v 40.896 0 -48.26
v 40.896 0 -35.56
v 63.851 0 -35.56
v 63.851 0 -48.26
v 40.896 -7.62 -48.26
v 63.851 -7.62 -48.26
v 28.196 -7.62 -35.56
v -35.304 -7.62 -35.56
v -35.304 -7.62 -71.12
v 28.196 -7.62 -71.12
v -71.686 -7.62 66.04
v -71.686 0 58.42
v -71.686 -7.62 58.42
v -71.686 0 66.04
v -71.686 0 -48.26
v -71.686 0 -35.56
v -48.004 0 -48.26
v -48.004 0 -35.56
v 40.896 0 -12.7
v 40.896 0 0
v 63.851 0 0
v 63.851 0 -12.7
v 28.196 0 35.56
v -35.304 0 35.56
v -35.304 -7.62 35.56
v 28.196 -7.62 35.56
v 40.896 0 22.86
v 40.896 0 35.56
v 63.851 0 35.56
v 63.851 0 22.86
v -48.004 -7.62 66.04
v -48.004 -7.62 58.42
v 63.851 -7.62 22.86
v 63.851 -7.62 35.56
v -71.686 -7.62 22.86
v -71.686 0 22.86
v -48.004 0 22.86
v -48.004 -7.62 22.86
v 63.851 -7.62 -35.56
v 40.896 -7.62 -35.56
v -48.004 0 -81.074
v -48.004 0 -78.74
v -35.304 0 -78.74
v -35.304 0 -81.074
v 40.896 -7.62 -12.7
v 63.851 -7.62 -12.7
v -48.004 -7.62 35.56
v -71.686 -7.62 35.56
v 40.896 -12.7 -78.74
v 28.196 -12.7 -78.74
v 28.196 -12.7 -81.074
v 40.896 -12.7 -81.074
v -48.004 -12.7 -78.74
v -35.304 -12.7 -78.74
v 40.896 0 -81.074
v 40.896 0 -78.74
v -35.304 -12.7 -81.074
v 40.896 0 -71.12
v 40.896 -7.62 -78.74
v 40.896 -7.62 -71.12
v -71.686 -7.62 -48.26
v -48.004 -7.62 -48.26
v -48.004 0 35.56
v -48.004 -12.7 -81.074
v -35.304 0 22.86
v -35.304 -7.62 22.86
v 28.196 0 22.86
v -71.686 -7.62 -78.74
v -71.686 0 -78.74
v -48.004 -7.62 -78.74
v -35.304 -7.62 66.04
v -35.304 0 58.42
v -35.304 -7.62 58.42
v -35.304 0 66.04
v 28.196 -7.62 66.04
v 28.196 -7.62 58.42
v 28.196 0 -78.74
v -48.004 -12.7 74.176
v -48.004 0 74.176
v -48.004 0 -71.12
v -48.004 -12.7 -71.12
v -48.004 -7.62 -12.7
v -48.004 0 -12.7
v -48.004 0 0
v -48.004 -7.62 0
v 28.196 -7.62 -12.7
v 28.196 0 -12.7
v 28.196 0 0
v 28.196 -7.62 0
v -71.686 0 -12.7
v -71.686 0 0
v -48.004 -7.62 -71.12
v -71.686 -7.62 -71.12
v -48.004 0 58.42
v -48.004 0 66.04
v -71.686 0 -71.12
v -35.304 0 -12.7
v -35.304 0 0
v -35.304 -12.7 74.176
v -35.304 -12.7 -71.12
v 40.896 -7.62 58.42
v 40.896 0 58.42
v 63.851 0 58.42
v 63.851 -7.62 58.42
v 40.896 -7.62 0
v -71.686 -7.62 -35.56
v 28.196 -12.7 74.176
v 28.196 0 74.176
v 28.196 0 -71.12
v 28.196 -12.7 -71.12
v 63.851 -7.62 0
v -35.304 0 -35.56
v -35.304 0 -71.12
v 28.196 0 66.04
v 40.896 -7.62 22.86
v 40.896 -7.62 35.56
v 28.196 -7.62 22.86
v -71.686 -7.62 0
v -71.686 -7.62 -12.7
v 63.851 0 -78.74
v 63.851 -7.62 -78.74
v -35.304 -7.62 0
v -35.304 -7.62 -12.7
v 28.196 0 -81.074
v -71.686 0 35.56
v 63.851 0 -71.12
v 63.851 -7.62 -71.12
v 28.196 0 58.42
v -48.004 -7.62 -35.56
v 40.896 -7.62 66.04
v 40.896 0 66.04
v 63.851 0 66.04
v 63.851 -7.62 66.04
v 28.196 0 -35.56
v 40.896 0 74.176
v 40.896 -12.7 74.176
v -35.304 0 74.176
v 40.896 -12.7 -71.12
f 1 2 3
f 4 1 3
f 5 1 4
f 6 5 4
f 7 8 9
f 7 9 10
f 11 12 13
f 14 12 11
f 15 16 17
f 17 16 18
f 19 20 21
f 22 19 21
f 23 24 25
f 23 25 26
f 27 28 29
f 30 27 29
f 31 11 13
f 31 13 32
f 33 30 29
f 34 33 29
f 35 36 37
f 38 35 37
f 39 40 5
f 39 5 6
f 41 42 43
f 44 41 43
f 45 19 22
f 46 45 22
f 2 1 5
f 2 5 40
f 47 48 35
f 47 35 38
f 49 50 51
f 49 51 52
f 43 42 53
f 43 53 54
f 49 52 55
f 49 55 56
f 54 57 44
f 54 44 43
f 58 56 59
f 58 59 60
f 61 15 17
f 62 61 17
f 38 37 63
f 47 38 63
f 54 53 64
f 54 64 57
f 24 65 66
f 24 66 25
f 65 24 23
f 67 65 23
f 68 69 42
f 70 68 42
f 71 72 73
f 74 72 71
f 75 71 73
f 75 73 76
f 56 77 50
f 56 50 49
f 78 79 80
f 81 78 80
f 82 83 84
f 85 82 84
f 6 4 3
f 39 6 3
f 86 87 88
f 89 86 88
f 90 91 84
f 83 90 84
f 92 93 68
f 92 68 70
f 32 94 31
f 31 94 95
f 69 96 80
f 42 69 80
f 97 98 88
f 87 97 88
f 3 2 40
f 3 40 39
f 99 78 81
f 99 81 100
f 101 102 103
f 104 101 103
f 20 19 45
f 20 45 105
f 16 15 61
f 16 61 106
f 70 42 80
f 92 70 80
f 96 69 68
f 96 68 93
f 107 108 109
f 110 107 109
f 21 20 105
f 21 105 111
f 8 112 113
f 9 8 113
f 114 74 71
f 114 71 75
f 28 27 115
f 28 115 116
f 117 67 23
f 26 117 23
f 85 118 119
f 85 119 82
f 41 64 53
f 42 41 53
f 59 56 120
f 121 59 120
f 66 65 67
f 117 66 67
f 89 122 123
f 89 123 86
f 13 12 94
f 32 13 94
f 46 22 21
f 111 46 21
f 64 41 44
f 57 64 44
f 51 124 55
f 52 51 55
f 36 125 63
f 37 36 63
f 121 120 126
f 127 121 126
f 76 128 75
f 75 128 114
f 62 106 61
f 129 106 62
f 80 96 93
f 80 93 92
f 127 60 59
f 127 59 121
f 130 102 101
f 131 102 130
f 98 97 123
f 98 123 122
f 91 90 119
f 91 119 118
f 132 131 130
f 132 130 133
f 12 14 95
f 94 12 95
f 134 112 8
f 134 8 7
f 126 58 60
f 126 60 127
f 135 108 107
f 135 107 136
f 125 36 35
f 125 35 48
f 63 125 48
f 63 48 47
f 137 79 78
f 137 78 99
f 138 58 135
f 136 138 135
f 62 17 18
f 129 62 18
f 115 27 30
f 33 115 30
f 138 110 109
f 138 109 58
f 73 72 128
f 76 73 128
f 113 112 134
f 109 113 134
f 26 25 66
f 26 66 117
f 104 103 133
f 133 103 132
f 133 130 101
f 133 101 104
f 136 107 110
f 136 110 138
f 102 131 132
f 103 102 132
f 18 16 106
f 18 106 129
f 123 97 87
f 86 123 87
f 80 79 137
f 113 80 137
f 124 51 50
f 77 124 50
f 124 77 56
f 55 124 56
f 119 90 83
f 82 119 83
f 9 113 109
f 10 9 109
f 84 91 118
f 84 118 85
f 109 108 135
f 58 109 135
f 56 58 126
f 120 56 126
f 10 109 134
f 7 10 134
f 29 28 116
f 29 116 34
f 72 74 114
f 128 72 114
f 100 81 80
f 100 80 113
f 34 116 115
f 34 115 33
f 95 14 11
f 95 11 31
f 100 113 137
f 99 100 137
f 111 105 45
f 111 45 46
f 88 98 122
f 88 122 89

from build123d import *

# Parameters (mm, degrees)
F0_W     = 12.7
F0_H     = 8.135657315
F0_H_2   = 22.86
F0_H_3   = 7.62
F0_H_4   = 12.7
F1_DEPTH = 12.7
F0_H_5   = 2.3344613409
F0_W_2   = 23.6822664738
F2_DEPTH = 7.62
F0_W_3   = 63.5
F0_W_4   = 22.954866147


# Not quite as in the source:
# - a feature names something its author has since deleted; it is built from what else it names


with BuildPart() as f1:
    # F0 (on Front) → F1 (new body)
    with BuildSketch(Plane.XZ):
        with Locations((-41.6535617948, 70.1078286575)):
            Rectangle(F0_W, F0_H)
        with Locations((-41.6535617948, 46.99)):
            Rectangle(F0_W, F0_H_2)
        with Locations((-41.6535617948, 11.43)):
            Rectangle(F0_W, F0_H_2)
        with Locations((-41.6535617948, -24.13)):
            Rectangle(F0_W, F0_H_2)
        with Locations((-41.6535617948, 62.23)):
            Rectangle(F0_W, F0_H_3)
        Polygon((-35.3035617948, -71.12), (-35.3035617948, -67.4191057513), (-35.3035617948, -48.26), (-48.0035617948, -48.26), (-48.0035617948, -67.4191057513), (-48.0035617948, -71.12), align=None)
        with Locations((-41.6535617948, -41.91)):
            Rectangle(F0_W, F0_H_4)
        with Locations((-41.6535617948, -6.35)):
            Rectangle(F0_W, F0_H_4)
        with Locations((-41.6535617948, 29.21)):
            Rectangle(F0_W, F0_H_4)
    extrude(amount=F1_DEPTH)


with BuildPart() as f1b:
    # F0 (on Front) → F1, piece 2 (new body)
    with BuildSketch(Plane.XZ):
        with Locations((34.5464382052, 70.1078286575)):
            Rectangle(F0_W, F0_H)
        with Locations((34.5464382052, 46.99)):
            Rectangle(F0_W, F0_H_2)
        with Locations((34.5464382052, 11.43)):
            Rectangle(F0_W, F0_H_2)
        with Locations((34.5464382052, -24.13)):
            Rectangle(F0_W, F0_H_2)
        with Locations((34.5464382052, 62.23)):
            Rectangle(F0_W, F0_H_3)
        with Locations((34.5464382052, 29.21)):
            Rectangle(F0_W, F0_H_4)
        with Locations((34.5464382052, -6.35)):
            Rectangle(F0_W, F0_H_4)
        with Locations((34.5464382052, -41.91)):
            Rectangle(F0_W, F0_H_4)
        Polygon((40.8964382052, -48.26), (28.1964382052, -48.26), (28.1964382052, -67.4191057513), (28.1964382052, -71.12), (40.8964382052, -71.12), (40.8964382052, -67.4191057513), align=None)
    extrude(amount=F1_DEPTH)


with BuildPart() as f1c:
    # F0 (on Front) → F1, piece 3 (new body)
    with BuildSketch(Plane.XZ):
        with Locations((34.5464382052, -79.9072306705)):
            Rectangle(F0_W, F0_H_5)
    extrude(amount=F1_DEPTH)


with BuildPart() as f1d:
    # F0 (on Front) → F1, piece 4 (new body)
    with BuildSketch(Plane.XZ):
        with Locations((-41.6535617948, -79.9072306705)):
            Rectangle(F0_W, F0_H_5)
    extrude(amount=F1_DEPTH)


with BuildPart() as f2:
    # F0 (on Front) → F2 (new body)
    with BuildSketch(Plane.XZ):
        with Locations((-59.8446950316, 62.23)):
            Rectangle(F0_W_2, F0_H_3)
    extrude(amount=F2_DEPTH)


with BuildPart() as f2b:
    # F0 (on Front) → F2, piece 2 (new body)
    with BuildSketch(Plane.XZ):
        with Locations((-3.5535617948, 62.23)):
            Rectangle(F0_W_3, F0_H_3)
    extrude(amount=F2_DEPTH)


with BuildPart() as f2c:
    # F0 (on Front) → F2, piece 3 (new body)
    with BuildSketch(Plane.XZ):
        with Locations((-59.8446950316, 29.21)):
            Rectangle(F0_W_2, F0_H_4)
    extrude(amount=F2_DEPTH)


with BuildPart() as f2d:
    # F0 (on Front) → F2, piece 4 (new body)
    with BuildSketch(Plane.XZ):
        with Locations((-3.5535617948, 29.21)):
            Rectangle(F0_W_3, F0_H_4)
    extrude(amount=F2_DEPTH)


with BuildPart() as f2e:
    # F0 (on Front) → F2, piece 5 (new body)
    with BuildSketch(Plane.XZ):
        with Locations((-59.8446950316, -6.35)):
            Rectangle(F0_W_2, F0_H_4)
    extrude(amount=F2_DEPTH)


with BuildPart() as f2f:
    # F0 (on Front) → F2, piece 6 (new body)
    with BuildSketch(Plane.XZ):
        with Locations((-3.5535617948, -6.35)):
            Rectangle(F0_W_3, F0_H_4)
    extrude(amount=F2_DEPTH)


with BuildPart() as f2g:
    # F0 (on Front) → F2, piece 7 (new body)
    with BuildSketch(Plane.XZ):
        with Locations((-59.8446950316, -41.91)):
            Rectangle(F0_W_2, F0_H_4)
    extrude(amount=F2_DEPTH)


with BuildPart() as f2h:
    # F0 (on Front) → F2, piece 8 (new body)
    with BuildSketch(Plane.XZ):
        with Locations((-3.5535617948, -41.91)):
            Rectangle(F0_W_3, F0_H_4)
        Polygon((-35.3035617948, -48.26), (-35.3035617948, -67.4191057513), (-35.3035617948, -71.12), (28.1964382052, -71.12), (28.1964382052, -67.4191057513), (28.1964382052, -48.26), align=None)
    extrude(amount=F2_DEPTH)


with BuildPart() as f2i:
    # F0 (on Front) → F2, piece 9 (new body)
    with BuildSketch(Plane.XZ):
        with Locations((-59.8446950316, -74.93)):
            Rectangle(F0_W_2, F0_H_3)
    extrude(amount=F2_DEPTH)


with BuildPart() as f2j:
    # F0 (on Front) → F2, piece 10 (new body)
    with BuildSketch(Plane.XZ):
        with Locations((52.3738712788, -74.93)):
            Rectangle(F0_W_4, F0_H_3)
    extrude(amount=F2_DEPTH)


with BuildPart() as f2k:
    # F0 (on Front) → F2, piece 11 (new body)
    with BuildSketch(Plane.XZ):
        with Locations((52.3738712788, -41.91)):
            Rectangle(F0_W_4, F0_H_4)
    extrude(amount=F2_DEPTH)


with BuildPart() as f2l:
    # F0 (on Front) → F2, piece 12 (new body)
    with BuildSketch(Plane.XZ):
        with Locations((52.3738712788, -6.35)):
            Rectangle(F0_W_4, F0_H_4)
    extrude(amount=F2_DEPTH)


with BuildPart() as f2m:
    # F0 (on Front) → F2, piece 13 (new body)
    with BuildSketch(Plane.XZ):
        with Locations((52.3738712788, 29.21)):
            Rectangle(F0_W_4, F0_H_4)
    extrude(amount=F2_DEPTH)


with BuildPart() as f2n:
    # F0 (on Front) → F2, piece 14 (new body)
    with BuildSketch(Plane.XZ):
        with Locations((52.3738712788, 62.23)):
            Rectangle(F0_W_4, F0_H_3)
    extrude(amount=F2_DEPTH)


solid = Compound([f1.part, f1b.part, f1c.part, f1d.part, f2.part, f2b.part, f2c.part, f2d.part, f2e.part, f2f.part, f2g.part, f2h.part, f2i.part, f2j.part, f2k.part, f2l.part, f2m.part, f2n.part])
